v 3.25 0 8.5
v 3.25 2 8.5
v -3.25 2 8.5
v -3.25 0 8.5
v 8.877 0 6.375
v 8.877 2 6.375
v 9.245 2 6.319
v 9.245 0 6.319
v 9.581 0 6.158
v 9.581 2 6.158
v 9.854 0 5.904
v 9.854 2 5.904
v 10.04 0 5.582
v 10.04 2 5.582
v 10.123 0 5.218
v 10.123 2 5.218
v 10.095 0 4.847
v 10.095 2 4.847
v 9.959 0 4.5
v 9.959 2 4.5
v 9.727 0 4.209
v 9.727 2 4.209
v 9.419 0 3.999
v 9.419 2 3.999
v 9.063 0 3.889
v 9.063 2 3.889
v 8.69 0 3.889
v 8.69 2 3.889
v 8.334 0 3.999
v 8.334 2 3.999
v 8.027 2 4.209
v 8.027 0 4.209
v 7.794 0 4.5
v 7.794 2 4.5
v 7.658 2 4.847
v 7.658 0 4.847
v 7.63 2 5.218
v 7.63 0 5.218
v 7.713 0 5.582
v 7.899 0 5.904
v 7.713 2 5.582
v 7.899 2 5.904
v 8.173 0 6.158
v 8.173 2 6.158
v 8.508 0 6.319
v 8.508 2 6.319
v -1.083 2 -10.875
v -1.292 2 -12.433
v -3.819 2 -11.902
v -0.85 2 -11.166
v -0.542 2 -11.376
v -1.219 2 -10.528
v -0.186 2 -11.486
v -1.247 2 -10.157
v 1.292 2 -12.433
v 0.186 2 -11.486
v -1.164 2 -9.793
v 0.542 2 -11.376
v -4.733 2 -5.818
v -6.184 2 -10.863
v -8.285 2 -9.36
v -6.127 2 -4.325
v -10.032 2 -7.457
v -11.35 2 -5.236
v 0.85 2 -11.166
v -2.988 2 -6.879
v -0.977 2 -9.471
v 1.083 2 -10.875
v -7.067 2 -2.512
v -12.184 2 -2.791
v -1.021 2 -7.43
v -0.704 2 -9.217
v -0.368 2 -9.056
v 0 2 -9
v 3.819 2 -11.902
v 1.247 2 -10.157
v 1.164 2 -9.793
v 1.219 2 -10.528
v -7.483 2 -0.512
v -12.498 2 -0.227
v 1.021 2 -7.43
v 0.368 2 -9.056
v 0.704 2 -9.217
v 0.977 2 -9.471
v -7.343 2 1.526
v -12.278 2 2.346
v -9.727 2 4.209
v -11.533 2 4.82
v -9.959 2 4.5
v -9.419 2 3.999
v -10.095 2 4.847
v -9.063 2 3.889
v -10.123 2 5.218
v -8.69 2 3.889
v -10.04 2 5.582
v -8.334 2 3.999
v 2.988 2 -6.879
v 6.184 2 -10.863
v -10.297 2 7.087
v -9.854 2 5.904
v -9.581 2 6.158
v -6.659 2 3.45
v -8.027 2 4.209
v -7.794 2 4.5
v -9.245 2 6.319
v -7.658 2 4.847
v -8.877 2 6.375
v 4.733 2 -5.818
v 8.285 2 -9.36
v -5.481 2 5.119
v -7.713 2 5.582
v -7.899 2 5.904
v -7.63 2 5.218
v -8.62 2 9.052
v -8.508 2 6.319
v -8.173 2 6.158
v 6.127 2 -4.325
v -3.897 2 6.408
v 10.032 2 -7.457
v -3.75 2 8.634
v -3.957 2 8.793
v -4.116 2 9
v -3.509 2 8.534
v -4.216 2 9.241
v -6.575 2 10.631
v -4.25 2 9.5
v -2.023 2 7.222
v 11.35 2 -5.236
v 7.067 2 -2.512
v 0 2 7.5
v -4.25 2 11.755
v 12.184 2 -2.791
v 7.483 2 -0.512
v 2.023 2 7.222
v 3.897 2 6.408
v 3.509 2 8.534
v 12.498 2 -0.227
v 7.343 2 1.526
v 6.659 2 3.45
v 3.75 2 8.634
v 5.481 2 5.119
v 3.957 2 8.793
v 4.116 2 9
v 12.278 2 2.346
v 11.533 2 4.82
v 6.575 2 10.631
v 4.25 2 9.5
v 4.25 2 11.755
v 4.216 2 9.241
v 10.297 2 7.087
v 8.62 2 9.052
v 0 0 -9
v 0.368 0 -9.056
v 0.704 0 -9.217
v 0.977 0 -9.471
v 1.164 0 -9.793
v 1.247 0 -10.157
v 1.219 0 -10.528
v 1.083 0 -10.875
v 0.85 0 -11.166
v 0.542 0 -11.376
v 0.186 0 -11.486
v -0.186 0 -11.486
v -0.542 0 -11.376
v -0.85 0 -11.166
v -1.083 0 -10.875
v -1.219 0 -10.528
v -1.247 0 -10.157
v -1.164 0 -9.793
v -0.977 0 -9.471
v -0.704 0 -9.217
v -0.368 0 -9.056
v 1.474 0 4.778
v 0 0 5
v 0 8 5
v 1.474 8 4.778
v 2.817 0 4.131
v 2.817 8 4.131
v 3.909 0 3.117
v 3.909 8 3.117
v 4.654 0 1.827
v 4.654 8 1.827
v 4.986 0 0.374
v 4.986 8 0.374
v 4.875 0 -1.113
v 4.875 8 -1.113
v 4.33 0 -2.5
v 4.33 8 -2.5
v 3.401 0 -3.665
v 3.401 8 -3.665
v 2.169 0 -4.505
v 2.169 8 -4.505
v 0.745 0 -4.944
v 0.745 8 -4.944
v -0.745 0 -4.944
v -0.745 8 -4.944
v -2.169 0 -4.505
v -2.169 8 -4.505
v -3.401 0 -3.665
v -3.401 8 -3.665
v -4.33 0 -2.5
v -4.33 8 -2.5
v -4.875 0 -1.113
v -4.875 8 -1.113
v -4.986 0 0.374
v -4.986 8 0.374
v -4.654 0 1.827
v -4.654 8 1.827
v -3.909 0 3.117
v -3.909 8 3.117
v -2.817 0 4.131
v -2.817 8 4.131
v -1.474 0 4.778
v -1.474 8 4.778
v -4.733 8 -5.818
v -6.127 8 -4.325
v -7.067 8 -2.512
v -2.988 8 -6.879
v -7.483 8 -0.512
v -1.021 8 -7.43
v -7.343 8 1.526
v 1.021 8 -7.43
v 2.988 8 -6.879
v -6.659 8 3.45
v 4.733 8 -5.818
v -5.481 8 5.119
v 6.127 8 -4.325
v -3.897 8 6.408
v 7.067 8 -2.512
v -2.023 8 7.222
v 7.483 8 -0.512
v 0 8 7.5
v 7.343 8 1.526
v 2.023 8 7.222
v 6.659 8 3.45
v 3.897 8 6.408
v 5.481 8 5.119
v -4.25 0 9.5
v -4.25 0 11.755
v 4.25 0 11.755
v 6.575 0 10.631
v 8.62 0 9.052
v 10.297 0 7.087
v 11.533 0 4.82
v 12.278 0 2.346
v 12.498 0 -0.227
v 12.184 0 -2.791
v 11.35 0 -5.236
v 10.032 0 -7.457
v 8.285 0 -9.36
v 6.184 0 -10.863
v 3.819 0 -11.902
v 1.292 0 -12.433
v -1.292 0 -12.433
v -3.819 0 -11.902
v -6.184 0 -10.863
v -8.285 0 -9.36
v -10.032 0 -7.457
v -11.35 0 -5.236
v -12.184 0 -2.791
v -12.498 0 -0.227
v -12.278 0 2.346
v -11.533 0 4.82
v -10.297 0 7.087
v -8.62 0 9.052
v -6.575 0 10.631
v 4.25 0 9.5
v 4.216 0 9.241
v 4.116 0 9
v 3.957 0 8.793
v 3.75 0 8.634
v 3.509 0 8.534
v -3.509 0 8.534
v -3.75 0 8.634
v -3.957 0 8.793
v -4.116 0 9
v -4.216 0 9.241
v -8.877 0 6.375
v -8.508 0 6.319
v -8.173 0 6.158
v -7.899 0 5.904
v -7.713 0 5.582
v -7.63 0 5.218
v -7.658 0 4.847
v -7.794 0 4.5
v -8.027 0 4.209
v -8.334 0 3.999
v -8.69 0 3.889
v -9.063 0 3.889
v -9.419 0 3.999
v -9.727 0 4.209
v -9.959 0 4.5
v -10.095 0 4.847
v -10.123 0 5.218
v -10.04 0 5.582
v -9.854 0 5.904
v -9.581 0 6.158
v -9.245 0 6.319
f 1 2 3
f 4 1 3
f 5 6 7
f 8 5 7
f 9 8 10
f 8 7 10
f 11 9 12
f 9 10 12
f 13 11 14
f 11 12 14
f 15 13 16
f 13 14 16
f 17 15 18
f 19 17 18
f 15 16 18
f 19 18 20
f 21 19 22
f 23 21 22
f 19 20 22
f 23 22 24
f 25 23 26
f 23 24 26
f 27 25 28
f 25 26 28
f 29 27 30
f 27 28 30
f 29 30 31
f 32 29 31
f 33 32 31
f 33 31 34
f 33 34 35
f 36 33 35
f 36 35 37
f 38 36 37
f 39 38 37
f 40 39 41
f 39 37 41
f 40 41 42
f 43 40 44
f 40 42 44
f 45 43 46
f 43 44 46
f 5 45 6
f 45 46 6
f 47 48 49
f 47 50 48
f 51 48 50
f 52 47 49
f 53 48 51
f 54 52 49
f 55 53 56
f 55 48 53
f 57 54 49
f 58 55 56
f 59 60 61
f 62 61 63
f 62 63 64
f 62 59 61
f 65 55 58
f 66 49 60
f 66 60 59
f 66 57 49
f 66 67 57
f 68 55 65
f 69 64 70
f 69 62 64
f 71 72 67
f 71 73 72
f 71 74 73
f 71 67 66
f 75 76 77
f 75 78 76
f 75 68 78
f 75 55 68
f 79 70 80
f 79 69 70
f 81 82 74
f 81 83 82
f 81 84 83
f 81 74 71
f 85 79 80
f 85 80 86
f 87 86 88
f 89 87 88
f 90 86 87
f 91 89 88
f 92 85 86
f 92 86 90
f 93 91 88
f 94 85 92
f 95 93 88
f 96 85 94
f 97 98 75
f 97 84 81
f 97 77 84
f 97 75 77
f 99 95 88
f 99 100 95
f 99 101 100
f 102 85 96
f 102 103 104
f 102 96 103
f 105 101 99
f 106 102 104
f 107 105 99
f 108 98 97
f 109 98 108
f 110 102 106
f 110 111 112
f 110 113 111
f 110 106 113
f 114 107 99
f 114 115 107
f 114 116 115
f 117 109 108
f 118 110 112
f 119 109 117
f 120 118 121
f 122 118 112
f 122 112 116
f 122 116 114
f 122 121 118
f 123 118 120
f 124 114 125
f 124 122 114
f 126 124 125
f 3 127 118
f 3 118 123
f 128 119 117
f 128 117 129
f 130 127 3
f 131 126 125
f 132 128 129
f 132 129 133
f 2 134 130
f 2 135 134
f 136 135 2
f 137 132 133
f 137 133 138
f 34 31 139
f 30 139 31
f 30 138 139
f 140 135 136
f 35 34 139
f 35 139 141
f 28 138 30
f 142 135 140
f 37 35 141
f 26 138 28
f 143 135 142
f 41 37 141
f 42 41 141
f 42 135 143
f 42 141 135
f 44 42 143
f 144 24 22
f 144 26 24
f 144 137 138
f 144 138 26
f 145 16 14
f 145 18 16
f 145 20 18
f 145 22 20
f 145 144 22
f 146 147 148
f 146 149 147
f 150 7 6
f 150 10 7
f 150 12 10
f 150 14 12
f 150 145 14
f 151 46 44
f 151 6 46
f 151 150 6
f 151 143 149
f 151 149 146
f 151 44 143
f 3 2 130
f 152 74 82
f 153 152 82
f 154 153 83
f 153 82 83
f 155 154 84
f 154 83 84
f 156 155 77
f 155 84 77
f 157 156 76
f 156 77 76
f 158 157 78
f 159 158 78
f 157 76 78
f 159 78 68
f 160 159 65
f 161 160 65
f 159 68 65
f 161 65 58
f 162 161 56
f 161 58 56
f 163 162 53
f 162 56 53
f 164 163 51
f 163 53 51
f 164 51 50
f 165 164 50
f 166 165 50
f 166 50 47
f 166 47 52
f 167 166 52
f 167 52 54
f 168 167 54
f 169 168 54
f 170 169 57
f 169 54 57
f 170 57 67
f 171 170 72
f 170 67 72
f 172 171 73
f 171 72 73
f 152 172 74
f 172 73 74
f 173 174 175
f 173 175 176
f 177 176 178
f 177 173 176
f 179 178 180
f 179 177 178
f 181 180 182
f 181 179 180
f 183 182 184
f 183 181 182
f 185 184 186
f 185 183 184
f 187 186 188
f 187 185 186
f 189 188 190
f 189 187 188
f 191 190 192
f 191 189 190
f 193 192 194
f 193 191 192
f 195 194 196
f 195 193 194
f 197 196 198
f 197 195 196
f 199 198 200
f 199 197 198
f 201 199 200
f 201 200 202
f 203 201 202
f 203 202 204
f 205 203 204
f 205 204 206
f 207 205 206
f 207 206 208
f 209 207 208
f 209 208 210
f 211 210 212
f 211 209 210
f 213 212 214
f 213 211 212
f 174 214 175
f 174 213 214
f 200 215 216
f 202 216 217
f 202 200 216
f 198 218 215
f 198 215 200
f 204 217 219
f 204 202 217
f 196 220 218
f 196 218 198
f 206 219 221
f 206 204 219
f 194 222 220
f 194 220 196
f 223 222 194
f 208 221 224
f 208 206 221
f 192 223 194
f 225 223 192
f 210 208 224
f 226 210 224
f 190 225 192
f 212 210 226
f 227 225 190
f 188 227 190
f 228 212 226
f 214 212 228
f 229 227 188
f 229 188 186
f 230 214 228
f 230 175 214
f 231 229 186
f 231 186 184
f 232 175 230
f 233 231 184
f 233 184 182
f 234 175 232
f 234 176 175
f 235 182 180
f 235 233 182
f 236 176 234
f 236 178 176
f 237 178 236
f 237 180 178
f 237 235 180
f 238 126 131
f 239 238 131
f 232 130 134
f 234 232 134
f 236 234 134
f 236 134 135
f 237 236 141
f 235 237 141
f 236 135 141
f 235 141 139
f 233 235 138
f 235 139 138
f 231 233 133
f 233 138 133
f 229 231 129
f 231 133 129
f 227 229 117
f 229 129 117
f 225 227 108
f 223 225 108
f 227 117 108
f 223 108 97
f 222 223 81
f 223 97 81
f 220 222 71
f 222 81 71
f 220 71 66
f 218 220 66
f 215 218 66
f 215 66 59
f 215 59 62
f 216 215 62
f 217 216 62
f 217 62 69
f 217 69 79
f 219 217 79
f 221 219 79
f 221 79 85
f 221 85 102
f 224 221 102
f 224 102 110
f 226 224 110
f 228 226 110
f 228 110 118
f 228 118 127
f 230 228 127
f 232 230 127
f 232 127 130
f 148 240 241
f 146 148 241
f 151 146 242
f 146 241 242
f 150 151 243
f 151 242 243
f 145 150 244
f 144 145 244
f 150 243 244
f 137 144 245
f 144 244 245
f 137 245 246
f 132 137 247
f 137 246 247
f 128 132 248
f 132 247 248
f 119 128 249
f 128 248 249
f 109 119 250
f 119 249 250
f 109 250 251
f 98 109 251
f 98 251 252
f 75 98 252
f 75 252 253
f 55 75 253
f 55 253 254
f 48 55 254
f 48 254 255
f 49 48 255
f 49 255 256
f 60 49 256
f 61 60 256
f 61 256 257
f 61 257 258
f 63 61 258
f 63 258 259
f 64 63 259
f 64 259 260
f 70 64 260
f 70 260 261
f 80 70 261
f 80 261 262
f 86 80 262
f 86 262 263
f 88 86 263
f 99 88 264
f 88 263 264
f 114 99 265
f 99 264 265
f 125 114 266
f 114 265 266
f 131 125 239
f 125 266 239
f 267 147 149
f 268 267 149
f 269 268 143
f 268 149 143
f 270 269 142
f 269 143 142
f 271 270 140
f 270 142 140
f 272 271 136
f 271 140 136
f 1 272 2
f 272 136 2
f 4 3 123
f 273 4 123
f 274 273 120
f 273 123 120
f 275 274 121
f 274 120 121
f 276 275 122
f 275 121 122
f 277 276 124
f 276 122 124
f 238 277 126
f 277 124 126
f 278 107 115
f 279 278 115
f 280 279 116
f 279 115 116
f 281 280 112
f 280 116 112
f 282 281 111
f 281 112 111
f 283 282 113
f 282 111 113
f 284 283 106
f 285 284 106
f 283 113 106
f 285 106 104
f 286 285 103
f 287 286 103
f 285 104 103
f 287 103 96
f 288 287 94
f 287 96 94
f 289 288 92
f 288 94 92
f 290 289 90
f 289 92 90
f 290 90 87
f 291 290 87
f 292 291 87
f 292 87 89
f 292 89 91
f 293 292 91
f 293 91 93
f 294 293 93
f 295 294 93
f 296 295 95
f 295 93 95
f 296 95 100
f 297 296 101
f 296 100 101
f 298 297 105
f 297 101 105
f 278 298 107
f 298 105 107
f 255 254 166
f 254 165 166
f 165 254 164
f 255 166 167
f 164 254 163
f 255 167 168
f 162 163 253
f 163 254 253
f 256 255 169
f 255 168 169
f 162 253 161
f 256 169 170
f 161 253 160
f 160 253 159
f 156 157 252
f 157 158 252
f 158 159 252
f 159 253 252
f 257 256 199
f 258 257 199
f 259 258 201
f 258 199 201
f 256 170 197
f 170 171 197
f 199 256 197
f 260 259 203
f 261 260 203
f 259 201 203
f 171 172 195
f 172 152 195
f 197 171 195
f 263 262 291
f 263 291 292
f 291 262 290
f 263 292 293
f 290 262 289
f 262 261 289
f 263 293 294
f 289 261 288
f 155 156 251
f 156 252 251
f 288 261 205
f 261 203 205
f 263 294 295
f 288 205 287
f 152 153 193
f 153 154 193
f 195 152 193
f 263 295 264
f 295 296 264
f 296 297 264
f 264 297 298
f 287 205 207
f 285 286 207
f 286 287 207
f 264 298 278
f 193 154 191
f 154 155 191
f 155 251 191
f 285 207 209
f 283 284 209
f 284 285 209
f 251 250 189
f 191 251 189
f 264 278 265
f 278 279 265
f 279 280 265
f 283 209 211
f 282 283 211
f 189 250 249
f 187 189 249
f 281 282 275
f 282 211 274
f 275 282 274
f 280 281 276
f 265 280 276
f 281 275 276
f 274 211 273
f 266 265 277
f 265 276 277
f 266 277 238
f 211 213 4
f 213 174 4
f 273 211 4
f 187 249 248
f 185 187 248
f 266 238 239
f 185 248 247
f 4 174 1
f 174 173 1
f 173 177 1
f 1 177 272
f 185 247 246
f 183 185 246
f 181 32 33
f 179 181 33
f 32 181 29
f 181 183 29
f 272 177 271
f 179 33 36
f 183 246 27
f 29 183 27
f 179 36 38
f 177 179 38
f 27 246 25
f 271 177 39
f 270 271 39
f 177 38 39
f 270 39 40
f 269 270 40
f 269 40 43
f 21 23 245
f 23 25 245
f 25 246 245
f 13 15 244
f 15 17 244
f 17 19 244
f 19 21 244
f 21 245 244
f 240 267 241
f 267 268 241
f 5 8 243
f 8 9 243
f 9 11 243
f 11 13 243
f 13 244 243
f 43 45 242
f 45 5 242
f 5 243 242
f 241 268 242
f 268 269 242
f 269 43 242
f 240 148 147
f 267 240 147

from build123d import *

# Parameters (mm, degrees)
SKETCH1_R           = 12.5
SKETCH1_R_2         = 7.5
BOSS_EXTRUDE1_DEPTH = 2
SKETCH1_3_R         = 7.5
SKETCH1_3_R_2       = 5
BOSS_EXTRUDE2_DEPTH = 8
CUT_EXTRUDE1_DEPTH  = 2
SKETCH3_R           = 1.25
CUT_EXTRUDE2_DEPTH  = 2


with BuildPart() as part:
    # Sketch1 → Boss-Extrude1 (new body)
    with BuildSketch(Plane(origin=(0, 0, 0), x_dir=(1, 0, 0), z_dir=(0, 1, 0))):
        with Locations(Location((0, 0, 0), (0, 0, 270))):
            Circle(SKETCH1_R)
        with Locations(Location((0, 0, 0), (0, 0, 270))):
            Circle(SKETCH1_R_2, mode=Mode.SUBTRACT)
    extrude(amount=BOSS_EXTRUDE1_DEPTH)

    # Sketch1<3> → Boss-Extrude2 (add)
    with BuildSketch(Plane(origin=(0, 0, 0), x_dir=(1, 0, 0), z_dir=(0, 1, 0))):
        with Locations(Location((0, 0, 0), (0, 0, 270))):
            Circle(SKETCH1_3_R)
        with Locations(Location((0, 0, 0), (0, 0, 270))):
            Circle(SKETCH1_3_R_2, mode=Mode.SUBTRACT)
    extrude(amount=BOSS_EXTRUDE2_DEPTH)

    # Sketch2 → Cut-Extrude1 (cut)
    with BuildSketch(Plane(origin=(0, 2, 0), x_dir=(1, 0, 0), z_dir=(0, 1, 0))):
        with BuildLine():
            Line((-4.25, -13.5), (4.25, -13.5))
            Line((4.25, -13.5), (4.25, -9.5))
            ThreePointArc((4.25, -9.5), (3.957106781, -8.792893219), (3.25, -8.5))
            Line((3.25, -8.5), (-3.25, -8.5))
            ThreePointArc((-3.25, -8.5), (-3.957106781, -8.792893219), (-4.25, -9.5))
            Line((-4.25, -9.5), (-4.25, -13.5))
        make_face()
    extrude(amount=-CUT_EXTRUDE1_DEPTH, mode=Mode.SUBTRACT)

    # Sketch3 → Cut-Extrude2 (cut)
    with BuildSketch(Plane(origin=(0, 2, 0), x_dir=(1, 0, 0), z_dir=(0, 1, 0))):
        with Locations(Location((0, 10.25, 0), (0, 0, 270))):
            Circle(SKETCH3_R)
        with Locations(Location((8.876760389, -5.125, 0), (0, 0, 270))):
            Circle(SKETCH3_R)
        with Locations(Location((-8.876760389, -5.125, 0), (0, 0, 270))):
            Circle(SKETCH3_R)
    extrude(amount=-CUT_EXTRUDE2_DEPTH, mode=Mode.SUBTRACT)


solid = part.part
